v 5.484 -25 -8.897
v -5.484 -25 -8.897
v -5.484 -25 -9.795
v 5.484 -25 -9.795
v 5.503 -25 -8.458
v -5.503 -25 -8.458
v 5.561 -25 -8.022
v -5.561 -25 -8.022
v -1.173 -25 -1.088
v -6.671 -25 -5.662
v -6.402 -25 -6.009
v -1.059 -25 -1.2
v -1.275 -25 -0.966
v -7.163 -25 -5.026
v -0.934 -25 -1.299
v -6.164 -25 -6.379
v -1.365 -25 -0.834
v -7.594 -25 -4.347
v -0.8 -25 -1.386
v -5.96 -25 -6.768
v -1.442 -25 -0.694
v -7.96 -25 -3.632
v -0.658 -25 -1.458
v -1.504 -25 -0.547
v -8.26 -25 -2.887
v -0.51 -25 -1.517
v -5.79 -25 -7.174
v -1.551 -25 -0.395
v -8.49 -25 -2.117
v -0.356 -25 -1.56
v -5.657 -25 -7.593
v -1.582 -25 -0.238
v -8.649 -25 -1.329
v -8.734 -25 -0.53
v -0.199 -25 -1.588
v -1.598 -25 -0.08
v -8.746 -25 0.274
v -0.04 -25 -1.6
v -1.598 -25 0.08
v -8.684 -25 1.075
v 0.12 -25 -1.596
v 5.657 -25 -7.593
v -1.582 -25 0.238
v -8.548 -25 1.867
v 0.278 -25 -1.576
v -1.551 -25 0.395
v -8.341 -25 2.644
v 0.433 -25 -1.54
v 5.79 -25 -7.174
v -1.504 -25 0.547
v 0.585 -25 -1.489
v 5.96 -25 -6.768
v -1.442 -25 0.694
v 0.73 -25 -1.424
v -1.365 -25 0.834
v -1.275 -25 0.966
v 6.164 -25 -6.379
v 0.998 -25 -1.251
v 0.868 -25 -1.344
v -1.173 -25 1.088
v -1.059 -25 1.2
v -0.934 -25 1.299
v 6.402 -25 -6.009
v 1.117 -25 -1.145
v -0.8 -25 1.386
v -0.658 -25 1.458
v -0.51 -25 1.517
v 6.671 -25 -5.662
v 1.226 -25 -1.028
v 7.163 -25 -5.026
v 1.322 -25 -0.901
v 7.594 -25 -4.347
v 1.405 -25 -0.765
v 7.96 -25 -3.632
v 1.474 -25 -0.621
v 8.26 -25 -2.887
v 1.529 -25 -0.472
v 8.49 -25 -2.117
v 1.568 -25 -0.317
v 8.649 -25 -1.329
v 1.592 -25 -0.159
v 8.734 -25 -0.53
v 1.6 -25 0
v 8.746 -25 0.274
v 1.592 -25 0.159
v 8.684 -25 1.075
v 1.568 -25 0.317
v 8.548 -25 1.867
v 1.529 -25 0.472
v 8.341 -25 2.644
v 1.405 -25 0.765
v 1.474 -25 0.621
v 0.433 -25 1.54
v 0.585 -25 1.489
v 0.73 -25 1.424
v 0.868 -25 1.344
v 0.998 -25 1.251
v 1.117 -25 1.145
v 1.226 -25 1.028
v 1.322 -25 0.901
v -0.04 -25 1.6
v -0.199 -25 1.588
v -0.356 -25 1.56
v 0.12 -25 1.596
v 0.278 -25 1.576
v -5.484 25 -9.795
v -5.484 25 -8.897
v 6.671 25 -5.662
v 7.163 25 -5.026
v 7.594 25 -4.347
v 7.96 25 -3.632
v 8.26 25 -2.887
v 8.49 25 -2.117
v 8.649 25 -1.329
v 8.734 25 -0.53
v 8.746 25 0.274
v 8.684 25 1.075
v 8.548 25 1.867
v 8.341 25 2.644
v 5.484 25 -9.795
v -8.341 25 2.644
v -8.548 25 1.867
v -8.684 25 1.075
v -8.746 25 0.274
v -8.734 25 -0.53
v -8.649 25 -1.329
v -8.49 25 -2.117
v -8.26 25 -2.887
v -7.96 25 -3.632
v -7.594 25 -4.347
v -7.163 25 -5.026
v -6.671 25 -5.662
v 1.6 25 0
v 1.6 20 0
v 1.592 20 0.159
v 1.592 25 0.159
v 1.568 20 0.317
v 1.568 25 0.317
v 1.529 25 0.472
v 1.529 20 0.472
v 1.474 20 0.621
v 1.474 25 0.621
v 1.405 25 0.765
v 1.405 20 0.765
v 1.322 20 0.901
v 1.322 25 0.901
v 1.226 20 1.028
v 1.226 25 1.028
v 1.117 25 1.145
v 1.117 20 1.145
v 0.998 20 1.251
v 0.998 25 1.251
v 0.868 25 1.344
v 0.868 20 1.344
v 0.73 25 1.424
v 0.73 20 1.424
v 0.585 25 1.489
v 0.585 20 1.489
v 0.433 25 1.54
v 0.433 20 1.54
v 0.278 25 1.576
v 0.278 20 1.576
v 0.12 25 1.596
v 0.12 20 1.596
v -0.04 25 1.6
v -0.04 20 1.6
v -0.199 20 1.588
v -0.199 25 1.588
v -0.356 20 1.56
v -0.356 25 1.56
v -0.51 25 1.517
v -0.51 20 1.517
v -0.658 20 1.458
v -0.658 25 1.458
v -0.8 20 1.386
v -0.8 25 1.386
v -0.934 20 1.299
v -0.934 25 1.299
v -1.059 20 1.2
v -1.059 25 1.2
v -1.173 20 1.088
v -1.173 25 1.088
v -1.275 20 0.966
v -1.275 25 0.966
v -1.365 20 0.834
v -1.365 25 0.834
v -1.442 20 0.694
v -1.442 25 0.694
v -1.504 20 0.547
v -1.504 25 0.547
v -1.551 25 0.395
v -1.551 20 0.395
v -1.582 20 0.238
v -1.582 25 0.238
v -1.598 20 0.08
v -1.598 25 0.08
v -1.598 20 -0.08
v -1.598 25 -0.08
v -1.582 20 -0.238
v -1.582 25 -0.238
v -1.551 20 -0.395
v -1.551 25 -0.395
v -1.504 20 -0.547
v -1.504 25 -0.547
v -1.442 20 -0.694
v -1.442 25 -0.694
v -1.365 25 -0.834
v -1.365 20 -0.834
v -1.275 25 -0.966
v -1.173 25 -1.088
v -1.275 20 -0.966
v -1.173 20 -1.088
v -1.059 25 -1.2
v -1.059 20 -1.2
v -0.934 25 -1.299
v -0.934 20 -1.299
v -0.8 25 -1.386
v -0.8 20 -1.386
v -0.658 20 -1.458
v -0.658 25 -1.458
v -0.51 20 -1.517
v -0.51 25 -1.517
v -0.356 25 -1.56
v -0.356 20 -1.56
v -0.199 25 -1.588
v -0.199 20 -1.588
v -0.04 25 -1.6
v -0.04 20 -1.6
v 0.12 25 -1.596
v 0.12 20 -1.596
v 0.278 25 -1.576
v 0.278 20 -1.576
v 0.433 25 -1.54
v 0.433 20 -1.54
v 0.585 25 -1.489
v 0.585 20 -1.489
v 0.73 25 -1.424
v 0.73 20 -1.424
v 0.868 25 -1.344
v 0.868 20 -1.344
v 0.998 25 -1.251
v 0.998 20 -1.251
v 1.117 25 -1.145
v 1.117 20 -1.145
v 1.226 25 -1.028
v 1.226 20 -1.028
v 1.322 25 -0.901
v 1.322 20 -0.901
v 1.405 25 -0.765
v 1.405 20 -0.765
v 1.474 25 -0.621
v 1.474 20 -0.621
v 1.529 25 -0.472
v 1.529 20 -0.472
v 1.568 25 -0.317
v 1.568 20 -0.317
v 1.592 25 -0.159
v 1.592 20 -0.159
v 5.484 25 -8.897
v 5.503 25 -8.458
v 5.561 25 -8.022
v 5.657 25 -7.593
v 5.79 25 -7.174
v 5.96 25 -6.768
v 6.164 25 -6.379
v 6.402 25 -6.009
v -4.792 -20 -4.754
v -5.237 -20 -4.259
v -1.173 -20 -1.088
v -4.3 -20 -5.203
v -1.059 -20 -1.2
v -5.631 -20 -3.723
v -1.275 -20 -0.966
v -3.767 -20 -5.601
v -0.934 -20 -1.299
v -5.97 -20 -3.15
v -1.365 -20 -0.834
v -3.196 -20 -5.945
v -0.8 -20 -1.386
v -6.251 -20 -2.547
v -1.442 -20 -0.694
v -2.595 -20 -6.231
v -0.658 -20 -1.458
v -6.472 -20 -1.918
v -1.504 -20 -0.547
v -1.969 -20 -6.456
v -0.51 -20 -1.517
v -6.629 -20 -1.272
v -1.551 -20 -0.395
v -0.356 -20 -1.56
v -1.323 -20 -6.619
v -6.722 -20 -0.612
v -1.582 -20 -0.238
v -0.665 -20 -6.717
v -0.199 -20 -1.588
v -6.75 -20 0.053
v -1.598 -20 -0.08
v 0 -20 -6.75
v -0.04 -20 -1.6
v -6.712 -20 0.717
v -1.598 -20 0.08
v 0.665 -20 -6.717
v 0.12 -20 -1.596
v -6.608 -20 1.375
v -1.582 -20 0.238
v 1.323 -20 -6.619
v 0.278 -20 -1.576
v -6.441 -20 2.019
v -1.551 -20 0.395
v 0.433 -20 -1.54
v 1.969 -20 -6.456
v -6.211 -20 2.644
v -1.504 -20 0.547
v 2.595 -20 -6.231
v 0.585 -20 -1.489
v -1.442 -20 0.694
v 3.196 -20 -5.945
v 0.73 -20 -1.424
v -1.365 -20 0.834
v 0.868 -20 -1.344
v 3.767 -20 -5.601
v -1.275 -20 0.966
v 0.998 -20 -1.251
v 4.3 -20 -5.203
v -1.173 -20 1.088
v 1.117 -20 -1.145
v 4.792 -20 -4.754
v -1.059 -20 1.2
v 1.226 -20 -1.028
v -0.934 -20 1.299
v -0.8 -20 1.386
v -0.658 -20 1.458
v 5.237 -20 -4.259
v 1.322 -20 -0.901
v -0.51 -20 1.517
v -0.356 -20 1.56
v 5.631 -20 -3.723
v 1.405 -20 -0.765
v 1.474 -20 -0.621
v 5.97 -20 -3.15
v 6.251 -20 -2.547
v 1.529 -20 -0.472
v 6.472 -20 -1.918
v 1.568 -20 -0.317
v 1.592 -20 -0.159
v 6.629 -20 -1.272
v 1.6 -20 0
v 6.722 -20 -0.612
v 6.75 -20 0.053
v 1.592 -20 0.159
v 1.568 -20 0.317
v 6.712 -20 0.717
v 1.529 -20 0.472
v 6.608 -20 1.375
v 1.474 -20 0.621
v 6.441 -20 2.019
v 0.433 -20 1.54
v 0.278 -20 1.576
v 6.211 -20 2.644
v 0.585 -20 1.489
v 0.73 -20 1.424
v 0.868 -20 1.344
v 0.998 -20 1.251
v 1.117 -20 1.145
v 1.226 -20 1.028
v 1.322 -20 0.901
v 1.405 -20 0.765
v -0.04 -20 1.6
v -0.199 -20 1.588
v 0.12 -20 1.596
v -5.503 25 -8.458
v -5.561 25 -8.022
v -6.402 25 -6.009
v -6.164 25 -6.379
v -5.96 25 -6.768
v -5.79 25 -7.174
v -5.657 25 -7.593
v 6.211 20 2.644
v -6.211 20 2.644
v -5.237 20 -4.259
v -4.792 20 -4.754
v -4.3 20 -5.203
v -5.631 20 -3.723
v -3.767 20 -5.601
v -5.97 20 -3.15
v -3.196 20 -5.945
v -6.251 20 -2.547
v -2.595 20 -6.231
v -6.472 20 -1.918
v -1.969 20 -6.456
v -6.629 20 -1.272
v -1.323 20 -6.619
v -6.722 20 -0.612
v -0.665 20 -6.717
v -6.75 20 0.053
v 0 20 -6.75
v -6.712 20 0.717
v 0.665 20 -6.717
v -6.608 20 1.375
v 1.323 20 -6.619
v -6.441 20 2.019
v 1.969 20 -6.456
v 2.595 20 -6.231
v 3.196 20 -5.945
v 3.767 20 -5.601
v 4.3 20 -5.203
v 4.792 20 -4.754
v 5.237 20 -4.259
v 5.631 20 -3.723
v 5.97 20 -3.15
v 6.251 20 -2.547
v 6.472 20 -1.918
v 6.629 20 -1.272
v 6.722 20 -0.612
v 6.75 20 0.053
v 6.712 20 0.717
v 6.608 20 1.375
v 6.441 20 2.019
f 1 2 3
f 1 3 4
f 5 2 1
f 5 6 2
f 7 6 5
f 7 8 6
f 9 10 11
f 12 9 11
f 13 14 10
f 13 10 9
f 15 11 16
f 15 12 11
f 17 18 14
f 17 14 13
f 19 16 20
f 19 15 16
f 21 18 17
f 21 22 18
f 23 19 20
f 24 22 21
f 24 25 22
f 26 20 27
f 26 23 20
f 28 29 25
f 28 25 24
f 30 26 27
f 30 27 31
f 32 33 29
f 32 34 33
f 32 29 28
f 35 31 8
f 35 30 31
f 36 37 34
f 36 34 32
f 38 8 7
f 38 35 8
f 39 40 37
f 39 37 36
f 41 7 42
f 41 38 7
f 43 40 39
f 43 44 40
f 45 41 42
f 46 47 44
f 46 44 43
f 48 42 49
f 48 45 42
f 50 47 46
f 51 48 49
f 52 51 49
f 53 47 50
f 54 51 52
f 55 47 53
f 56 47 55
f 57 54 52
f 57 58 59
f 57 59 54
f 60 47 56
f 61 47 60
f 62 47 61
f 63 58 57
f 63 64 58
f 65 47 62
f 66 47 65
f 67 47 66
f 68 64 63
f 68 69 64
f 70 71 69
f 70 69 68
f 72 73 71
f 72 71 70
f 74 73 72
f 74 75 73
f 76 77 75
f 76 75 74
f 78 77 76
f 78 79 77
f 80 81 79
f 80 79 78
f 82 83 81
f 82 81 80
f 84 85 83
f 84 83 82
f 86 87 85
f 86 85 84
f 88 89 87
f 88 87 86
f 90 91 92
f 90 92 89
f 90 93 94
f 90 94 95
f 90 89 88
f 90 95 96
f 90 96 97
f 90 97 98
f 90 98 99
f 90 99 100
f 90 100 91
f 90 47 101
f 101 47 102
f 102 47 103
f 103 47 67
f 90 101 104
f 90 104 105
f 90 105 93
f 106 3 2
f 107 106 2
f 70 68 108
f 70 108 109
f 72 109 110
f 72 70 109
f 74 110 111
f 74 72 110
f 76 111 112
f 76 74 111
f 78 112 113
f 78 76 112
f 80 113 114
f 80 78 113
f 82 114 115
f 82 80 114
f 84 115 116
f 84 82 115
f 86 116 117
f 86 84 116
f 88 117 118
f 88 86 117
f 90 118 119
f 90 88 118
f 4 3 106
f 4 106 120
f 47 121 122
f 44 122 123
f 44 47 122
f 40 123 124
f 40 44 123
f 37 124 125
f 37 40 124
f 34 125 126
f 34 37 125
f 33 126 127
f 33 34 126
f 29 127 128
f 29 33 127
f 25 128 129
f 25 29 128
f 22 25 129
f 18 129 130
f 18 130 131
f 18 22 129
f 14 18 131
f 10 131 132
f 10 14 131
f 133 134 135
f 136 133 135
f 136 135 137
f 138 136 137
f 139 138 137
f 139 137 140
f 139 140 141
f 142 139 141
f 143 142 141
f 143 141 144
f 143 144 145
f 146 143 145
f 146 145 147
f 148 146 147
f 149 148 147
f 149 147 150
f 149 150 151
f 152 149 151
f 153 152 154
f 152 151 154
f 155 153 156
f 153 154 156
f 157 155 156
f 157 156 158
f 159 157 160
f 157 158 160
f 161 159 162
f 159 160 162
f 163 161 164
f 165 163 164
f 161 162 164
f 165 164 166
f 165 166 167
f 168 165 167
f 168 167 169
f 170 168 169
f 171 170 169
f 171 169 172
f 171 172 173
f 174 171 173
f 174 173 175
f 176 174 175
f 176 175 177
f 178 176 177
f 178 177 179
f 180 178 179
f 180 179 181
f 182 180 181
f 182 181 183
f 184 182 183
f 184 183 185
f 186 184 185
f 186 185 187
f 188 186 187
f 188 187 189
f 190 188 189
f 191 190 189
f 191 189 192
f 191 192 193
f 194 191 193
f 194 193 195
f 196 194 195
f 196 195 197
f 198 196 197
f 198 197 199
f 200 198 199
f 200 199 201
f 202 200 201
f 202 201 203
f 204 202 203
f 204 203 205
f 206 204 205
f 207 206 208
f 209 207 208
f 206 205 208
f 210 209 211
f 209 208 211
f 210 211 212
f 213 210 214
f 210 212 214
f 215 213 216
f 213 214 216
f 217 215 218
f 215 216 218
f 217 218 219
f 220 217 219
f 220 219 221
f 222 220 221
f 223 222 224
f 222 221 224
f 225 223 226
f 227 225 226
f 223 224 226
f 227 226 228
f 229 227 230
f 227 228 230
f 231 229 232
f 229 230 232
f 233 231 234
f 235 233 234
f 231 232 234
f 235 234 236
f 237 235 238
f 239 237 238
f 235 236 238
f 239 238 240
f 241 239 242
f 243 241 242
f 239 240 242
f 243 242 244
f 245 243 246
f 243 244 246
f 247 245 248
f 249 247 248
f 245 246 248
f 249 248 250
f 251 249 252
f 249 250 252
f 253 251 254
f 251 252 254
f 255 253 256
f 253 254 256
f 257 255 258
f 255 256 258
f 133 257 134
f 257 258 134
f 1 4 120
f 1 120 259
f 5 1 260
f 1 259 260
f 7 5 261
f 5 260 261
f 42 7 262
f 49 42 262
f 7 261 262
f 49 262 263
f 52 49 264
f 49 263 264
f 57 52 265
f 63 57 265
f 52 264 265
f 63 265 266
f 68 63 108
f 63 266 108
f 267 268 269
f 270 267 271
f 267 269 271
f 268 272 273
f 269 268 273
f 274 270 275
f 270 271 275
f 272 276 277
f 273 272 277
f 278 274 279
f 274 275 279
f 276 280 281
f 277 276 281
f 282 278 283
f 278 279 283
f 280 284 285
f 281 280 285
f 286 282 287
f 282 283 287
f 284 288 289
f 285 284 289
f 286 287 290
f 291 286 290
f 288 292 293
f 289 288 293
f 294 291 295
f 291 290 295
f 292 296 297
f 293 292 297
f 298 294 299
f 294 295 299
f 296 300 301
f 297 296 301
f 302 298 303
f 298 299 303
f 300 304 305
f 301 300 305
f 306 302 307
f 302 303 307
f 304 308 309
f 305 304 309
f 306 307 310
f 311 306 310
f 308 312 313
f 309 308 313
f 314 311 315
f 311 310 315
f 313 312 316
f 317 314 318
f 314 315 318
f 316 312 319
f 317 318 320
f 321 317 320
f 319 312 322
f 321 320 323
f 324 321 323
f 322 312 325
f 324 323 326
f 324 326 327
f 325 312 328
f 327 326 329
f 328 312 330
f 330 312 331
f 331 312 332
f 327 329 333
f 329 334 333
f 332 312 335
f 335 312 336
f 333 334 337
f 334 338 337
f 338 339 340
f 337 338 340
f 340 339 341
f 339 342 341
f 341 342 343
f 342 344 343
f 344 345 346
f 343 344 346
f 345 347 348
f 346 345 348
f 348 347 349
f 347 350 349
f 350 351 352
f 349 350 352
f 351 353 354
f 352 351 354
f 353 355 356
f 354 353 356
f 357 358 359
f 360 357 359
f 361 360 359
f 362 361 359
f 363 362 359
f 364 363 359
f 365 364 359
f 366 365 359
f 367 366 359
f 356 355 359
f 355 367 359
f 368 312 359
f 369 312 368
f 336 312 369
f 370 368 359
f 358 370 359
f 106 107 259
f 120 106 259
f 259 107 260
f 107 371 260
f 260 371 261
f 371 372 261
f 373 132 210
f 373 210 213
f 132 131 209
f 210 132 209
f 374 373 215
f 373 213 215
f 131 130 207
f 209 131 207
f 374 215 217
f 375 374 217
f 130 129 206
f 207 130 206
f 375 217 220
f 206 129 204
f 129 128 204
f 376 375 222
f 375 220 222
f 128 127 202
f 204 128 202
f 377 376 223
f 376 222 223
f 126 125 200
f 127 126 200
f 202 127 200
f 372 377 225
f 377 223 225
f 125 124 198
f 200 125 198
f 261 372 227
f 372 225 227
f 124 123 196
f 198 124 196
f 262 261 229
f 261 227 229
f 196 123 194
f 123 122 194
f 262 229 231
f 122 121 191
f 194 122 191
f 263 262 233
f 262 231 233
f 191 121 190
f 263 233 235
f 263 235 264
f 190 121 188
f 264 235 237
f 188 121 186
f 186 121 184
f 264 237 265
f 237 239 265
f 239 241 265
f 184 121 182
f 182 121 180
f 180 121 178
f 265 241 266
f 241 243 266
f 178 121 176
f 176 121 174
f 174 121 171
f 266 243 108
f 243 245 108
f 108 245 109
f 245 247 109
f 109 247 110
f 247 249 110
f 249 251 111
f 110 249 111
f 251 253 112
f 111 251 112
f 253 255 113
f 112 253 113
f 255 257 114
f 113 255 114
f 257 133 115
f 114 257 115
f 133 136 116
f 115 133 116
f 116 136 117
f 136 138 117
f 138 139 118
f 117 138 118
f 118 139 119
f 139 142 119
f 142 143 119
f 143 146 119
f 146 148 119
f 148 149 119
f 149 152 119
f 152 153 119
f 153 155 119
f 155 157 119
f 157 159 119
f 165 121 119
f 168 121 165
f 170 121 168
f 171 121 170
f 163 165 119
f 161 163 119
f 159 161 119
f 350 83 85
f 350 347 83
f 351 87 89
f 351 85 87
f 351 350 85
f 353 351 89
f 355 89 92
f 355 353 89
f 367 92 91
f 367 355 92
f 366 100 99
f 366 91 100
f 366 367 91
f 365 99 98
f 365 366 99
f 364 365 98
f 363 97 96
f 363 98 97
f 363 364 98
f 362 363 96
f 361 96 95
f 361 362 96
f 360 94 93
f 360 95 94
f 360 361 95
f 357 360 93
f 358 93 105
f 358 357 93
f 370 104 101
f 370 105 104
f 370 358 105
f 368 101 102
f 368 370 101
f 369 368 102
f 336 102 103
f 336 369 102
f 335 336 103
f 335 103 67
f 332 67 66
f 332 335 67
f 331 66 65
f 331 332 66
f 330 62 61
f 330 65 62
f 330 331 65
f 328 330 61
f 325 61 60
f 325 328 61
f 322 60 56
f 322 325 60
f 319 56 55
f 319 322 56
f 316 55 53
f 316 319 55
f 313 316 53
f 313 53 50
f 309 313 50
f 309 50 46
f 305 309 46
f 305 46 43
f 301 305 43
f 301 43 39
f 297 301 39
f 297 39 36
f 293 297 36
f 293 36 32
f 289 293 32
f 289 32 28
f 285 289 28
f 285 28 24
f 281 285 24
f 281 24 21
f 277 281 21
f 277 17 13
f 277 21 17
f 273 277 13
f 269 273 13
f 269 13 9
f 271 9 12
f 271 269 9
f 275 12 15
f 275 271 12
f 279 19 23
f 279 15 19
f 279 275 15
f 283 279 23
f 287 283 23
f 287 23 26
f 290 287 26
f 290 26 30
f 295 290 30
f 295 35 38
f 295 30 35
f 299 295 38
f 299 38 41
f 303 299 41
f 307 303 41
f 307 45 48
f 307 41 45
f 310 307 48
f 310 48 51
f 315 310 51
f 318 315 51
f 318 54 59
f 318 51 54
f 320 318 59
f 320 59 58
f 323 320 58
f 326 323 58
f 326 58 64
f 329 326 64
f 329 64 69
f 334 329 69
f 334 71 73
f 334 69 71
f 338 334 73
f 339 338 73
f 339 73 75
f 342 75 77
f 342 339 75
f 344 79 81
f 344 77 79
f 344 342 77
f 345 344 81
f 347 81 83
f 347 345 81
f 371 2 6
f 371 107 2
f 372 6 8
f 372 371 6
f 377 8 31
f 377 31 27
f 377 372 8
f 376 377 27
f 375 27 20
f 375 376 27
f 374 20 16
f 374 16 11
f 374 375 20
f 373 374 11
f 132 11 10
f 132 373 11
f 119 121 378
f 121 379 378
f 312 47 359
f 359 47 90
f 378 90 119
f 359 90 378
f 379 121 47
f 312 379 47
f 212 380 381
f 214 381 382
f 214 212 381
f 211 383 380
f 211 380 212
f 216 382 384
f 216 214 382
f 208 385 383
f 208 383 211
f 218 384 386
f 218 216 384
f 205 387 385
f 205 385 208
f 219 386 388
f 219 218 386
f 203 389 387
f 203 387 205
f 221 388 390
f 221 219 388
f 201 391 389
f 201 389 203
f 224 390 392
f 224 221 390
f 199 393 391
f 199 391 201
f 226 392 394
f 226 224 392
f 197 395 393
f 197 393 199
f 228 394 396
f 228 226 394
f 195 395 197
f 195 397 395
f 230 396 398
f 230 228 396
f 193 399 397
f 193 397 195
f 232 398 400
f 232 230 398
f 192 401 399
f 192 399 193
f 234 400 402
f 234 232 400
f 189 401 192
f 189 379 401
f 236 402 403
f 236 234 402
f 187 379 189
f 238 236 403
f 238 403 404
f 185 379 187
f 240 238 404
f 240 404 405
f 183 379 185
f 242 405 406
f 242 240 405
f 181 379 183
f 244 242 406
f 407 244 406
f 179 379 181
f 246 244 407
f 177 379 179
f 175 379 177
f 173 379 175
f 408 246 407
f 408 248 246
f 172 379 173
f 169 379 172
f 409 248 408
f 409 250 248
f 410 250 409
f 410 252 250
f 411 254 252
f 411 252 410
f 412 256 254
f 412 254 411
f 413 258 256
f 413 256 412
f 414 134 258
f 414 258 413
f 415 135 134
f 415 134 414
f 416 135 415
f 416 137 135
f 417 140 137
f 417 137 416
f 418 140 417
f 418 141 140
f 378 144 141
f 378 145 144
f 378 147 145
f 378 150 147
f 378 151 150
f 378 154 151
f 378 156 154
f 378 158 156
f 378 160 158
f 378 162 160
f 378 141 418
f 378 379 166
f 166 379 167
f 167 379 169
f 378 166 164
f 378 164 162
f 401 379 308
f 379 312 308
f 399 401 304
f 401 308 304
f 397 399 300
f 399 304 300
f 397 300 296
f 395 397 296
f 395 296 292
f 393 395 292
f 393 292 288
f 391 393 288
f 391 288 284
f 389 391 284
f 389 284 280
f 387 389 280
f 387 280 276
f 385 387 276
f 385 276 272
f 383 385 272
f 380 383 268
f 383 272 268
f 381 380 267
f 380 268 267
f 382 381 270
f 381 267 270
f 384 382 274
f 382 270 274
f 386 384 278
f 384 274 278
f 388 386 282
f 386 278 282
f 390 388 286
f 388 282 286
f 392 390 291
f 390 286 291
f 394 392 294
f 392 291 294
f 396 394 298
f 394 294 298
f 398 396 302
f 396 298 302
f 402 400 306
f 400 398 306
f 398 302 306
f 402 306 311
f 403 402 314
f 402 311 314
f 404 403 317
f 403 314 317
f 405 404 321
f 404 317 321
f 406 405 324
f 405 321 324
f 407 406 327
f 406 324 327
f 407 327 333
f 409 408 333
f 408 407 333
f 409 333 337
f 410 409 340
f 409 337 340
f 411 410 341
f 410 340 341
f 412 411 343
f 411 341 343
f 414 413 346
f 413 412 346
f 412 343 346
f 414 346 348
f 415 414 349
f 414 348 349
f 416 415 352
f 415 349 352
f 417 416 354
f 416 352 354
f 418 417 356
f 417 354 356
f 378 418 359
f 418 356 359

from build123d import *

# Parameters (mm, degrees)
F0_R           = 8.75
F1_DEPTH       = 25
F1_DEPTH_BACK  = 25
F2_R           = 6.75
F3_DEPTH       = 20
F3_DEPTH_BACK  = 20
F4_W           = 18.8391190022
F4_H           = 6.4964373596
F5_DEPTH       = 25.001
F5_DEPTH_BACK  = 25
F6_W           = 10.9675412329
F6_H           = 2.9768612129
F7_DEPTH       = 50
F8_R           = 5
F9_R           = 1.6
F10_DEPTH      = 25.001
F10_DEPTH_BACK = 25.001


with BuildPart() as f1:
    # F0 (on Front) → F1 (new body, two sides)
    with BuildSketch(Plane.XZ) as f1_sk:
        Circle(F0_R)
    extrude(amount=F1_DEPTH)
    extrude(f1_sk.sketch, amount=-F1_DEPTH_BACK)

    # F2 (on Front) → F3 (cut, two sides)
    with BuildSketch(Plane.XZ) as f3_sk:
        Circle(F2_R)
    extrude(amount=-F3_DEPTH, mode=Mode.SUBTRACT)
    extrude(f3_sk.sketch, amount=F3_DEPTH_BACK, mode=Mode.SUBTRACT)

    # F4 (on Front) → F5 (cut, two sides)
    with BuildSketch(Plane.XZ) as f5_sk:
        with Locations((0.2108290792, 5.8920474257)):
            Rectangle(F4_W, F4_H)
    extrude(amount=-F5_DEPTH, mode=Mode.SUBTRACT)
    extrude(f5_sk.sketch, amount=F5_DEPTH_BACK, mode=Mode.SUBTRACT)

    # F6 (on face) → F7 (join, through all)
    with BuildSketch(Plane.XZ.offset(25)):
        with Locations((0, -8.3068438988)):
            Rectangle(F6_W, F6_H)
    extrude(amount=-F7_DEPTH)

    # F8
    f8_edges = [f1.edges().sort_by_distance(p)[0] for p in [
        (5.483771, 0, -6.818413),
        (-5.483771, 0, -6.818413),
    ]]
    fillet(f8_edges, radius=F8_R)

    # F9 (on Front) → F10 (cut, two sides)
    with BuildSketch(Plane.XZ) as f10_sk:
        Circle(F9_R)
    extrude(amount=-F10_DEPTH, mode=Mode.SUBTRACT)
    extrude(f10_sk.sketch, amount=F10_DEPTH_BACK, mode=Mode.SUBTRACT)


solid = f1.part
